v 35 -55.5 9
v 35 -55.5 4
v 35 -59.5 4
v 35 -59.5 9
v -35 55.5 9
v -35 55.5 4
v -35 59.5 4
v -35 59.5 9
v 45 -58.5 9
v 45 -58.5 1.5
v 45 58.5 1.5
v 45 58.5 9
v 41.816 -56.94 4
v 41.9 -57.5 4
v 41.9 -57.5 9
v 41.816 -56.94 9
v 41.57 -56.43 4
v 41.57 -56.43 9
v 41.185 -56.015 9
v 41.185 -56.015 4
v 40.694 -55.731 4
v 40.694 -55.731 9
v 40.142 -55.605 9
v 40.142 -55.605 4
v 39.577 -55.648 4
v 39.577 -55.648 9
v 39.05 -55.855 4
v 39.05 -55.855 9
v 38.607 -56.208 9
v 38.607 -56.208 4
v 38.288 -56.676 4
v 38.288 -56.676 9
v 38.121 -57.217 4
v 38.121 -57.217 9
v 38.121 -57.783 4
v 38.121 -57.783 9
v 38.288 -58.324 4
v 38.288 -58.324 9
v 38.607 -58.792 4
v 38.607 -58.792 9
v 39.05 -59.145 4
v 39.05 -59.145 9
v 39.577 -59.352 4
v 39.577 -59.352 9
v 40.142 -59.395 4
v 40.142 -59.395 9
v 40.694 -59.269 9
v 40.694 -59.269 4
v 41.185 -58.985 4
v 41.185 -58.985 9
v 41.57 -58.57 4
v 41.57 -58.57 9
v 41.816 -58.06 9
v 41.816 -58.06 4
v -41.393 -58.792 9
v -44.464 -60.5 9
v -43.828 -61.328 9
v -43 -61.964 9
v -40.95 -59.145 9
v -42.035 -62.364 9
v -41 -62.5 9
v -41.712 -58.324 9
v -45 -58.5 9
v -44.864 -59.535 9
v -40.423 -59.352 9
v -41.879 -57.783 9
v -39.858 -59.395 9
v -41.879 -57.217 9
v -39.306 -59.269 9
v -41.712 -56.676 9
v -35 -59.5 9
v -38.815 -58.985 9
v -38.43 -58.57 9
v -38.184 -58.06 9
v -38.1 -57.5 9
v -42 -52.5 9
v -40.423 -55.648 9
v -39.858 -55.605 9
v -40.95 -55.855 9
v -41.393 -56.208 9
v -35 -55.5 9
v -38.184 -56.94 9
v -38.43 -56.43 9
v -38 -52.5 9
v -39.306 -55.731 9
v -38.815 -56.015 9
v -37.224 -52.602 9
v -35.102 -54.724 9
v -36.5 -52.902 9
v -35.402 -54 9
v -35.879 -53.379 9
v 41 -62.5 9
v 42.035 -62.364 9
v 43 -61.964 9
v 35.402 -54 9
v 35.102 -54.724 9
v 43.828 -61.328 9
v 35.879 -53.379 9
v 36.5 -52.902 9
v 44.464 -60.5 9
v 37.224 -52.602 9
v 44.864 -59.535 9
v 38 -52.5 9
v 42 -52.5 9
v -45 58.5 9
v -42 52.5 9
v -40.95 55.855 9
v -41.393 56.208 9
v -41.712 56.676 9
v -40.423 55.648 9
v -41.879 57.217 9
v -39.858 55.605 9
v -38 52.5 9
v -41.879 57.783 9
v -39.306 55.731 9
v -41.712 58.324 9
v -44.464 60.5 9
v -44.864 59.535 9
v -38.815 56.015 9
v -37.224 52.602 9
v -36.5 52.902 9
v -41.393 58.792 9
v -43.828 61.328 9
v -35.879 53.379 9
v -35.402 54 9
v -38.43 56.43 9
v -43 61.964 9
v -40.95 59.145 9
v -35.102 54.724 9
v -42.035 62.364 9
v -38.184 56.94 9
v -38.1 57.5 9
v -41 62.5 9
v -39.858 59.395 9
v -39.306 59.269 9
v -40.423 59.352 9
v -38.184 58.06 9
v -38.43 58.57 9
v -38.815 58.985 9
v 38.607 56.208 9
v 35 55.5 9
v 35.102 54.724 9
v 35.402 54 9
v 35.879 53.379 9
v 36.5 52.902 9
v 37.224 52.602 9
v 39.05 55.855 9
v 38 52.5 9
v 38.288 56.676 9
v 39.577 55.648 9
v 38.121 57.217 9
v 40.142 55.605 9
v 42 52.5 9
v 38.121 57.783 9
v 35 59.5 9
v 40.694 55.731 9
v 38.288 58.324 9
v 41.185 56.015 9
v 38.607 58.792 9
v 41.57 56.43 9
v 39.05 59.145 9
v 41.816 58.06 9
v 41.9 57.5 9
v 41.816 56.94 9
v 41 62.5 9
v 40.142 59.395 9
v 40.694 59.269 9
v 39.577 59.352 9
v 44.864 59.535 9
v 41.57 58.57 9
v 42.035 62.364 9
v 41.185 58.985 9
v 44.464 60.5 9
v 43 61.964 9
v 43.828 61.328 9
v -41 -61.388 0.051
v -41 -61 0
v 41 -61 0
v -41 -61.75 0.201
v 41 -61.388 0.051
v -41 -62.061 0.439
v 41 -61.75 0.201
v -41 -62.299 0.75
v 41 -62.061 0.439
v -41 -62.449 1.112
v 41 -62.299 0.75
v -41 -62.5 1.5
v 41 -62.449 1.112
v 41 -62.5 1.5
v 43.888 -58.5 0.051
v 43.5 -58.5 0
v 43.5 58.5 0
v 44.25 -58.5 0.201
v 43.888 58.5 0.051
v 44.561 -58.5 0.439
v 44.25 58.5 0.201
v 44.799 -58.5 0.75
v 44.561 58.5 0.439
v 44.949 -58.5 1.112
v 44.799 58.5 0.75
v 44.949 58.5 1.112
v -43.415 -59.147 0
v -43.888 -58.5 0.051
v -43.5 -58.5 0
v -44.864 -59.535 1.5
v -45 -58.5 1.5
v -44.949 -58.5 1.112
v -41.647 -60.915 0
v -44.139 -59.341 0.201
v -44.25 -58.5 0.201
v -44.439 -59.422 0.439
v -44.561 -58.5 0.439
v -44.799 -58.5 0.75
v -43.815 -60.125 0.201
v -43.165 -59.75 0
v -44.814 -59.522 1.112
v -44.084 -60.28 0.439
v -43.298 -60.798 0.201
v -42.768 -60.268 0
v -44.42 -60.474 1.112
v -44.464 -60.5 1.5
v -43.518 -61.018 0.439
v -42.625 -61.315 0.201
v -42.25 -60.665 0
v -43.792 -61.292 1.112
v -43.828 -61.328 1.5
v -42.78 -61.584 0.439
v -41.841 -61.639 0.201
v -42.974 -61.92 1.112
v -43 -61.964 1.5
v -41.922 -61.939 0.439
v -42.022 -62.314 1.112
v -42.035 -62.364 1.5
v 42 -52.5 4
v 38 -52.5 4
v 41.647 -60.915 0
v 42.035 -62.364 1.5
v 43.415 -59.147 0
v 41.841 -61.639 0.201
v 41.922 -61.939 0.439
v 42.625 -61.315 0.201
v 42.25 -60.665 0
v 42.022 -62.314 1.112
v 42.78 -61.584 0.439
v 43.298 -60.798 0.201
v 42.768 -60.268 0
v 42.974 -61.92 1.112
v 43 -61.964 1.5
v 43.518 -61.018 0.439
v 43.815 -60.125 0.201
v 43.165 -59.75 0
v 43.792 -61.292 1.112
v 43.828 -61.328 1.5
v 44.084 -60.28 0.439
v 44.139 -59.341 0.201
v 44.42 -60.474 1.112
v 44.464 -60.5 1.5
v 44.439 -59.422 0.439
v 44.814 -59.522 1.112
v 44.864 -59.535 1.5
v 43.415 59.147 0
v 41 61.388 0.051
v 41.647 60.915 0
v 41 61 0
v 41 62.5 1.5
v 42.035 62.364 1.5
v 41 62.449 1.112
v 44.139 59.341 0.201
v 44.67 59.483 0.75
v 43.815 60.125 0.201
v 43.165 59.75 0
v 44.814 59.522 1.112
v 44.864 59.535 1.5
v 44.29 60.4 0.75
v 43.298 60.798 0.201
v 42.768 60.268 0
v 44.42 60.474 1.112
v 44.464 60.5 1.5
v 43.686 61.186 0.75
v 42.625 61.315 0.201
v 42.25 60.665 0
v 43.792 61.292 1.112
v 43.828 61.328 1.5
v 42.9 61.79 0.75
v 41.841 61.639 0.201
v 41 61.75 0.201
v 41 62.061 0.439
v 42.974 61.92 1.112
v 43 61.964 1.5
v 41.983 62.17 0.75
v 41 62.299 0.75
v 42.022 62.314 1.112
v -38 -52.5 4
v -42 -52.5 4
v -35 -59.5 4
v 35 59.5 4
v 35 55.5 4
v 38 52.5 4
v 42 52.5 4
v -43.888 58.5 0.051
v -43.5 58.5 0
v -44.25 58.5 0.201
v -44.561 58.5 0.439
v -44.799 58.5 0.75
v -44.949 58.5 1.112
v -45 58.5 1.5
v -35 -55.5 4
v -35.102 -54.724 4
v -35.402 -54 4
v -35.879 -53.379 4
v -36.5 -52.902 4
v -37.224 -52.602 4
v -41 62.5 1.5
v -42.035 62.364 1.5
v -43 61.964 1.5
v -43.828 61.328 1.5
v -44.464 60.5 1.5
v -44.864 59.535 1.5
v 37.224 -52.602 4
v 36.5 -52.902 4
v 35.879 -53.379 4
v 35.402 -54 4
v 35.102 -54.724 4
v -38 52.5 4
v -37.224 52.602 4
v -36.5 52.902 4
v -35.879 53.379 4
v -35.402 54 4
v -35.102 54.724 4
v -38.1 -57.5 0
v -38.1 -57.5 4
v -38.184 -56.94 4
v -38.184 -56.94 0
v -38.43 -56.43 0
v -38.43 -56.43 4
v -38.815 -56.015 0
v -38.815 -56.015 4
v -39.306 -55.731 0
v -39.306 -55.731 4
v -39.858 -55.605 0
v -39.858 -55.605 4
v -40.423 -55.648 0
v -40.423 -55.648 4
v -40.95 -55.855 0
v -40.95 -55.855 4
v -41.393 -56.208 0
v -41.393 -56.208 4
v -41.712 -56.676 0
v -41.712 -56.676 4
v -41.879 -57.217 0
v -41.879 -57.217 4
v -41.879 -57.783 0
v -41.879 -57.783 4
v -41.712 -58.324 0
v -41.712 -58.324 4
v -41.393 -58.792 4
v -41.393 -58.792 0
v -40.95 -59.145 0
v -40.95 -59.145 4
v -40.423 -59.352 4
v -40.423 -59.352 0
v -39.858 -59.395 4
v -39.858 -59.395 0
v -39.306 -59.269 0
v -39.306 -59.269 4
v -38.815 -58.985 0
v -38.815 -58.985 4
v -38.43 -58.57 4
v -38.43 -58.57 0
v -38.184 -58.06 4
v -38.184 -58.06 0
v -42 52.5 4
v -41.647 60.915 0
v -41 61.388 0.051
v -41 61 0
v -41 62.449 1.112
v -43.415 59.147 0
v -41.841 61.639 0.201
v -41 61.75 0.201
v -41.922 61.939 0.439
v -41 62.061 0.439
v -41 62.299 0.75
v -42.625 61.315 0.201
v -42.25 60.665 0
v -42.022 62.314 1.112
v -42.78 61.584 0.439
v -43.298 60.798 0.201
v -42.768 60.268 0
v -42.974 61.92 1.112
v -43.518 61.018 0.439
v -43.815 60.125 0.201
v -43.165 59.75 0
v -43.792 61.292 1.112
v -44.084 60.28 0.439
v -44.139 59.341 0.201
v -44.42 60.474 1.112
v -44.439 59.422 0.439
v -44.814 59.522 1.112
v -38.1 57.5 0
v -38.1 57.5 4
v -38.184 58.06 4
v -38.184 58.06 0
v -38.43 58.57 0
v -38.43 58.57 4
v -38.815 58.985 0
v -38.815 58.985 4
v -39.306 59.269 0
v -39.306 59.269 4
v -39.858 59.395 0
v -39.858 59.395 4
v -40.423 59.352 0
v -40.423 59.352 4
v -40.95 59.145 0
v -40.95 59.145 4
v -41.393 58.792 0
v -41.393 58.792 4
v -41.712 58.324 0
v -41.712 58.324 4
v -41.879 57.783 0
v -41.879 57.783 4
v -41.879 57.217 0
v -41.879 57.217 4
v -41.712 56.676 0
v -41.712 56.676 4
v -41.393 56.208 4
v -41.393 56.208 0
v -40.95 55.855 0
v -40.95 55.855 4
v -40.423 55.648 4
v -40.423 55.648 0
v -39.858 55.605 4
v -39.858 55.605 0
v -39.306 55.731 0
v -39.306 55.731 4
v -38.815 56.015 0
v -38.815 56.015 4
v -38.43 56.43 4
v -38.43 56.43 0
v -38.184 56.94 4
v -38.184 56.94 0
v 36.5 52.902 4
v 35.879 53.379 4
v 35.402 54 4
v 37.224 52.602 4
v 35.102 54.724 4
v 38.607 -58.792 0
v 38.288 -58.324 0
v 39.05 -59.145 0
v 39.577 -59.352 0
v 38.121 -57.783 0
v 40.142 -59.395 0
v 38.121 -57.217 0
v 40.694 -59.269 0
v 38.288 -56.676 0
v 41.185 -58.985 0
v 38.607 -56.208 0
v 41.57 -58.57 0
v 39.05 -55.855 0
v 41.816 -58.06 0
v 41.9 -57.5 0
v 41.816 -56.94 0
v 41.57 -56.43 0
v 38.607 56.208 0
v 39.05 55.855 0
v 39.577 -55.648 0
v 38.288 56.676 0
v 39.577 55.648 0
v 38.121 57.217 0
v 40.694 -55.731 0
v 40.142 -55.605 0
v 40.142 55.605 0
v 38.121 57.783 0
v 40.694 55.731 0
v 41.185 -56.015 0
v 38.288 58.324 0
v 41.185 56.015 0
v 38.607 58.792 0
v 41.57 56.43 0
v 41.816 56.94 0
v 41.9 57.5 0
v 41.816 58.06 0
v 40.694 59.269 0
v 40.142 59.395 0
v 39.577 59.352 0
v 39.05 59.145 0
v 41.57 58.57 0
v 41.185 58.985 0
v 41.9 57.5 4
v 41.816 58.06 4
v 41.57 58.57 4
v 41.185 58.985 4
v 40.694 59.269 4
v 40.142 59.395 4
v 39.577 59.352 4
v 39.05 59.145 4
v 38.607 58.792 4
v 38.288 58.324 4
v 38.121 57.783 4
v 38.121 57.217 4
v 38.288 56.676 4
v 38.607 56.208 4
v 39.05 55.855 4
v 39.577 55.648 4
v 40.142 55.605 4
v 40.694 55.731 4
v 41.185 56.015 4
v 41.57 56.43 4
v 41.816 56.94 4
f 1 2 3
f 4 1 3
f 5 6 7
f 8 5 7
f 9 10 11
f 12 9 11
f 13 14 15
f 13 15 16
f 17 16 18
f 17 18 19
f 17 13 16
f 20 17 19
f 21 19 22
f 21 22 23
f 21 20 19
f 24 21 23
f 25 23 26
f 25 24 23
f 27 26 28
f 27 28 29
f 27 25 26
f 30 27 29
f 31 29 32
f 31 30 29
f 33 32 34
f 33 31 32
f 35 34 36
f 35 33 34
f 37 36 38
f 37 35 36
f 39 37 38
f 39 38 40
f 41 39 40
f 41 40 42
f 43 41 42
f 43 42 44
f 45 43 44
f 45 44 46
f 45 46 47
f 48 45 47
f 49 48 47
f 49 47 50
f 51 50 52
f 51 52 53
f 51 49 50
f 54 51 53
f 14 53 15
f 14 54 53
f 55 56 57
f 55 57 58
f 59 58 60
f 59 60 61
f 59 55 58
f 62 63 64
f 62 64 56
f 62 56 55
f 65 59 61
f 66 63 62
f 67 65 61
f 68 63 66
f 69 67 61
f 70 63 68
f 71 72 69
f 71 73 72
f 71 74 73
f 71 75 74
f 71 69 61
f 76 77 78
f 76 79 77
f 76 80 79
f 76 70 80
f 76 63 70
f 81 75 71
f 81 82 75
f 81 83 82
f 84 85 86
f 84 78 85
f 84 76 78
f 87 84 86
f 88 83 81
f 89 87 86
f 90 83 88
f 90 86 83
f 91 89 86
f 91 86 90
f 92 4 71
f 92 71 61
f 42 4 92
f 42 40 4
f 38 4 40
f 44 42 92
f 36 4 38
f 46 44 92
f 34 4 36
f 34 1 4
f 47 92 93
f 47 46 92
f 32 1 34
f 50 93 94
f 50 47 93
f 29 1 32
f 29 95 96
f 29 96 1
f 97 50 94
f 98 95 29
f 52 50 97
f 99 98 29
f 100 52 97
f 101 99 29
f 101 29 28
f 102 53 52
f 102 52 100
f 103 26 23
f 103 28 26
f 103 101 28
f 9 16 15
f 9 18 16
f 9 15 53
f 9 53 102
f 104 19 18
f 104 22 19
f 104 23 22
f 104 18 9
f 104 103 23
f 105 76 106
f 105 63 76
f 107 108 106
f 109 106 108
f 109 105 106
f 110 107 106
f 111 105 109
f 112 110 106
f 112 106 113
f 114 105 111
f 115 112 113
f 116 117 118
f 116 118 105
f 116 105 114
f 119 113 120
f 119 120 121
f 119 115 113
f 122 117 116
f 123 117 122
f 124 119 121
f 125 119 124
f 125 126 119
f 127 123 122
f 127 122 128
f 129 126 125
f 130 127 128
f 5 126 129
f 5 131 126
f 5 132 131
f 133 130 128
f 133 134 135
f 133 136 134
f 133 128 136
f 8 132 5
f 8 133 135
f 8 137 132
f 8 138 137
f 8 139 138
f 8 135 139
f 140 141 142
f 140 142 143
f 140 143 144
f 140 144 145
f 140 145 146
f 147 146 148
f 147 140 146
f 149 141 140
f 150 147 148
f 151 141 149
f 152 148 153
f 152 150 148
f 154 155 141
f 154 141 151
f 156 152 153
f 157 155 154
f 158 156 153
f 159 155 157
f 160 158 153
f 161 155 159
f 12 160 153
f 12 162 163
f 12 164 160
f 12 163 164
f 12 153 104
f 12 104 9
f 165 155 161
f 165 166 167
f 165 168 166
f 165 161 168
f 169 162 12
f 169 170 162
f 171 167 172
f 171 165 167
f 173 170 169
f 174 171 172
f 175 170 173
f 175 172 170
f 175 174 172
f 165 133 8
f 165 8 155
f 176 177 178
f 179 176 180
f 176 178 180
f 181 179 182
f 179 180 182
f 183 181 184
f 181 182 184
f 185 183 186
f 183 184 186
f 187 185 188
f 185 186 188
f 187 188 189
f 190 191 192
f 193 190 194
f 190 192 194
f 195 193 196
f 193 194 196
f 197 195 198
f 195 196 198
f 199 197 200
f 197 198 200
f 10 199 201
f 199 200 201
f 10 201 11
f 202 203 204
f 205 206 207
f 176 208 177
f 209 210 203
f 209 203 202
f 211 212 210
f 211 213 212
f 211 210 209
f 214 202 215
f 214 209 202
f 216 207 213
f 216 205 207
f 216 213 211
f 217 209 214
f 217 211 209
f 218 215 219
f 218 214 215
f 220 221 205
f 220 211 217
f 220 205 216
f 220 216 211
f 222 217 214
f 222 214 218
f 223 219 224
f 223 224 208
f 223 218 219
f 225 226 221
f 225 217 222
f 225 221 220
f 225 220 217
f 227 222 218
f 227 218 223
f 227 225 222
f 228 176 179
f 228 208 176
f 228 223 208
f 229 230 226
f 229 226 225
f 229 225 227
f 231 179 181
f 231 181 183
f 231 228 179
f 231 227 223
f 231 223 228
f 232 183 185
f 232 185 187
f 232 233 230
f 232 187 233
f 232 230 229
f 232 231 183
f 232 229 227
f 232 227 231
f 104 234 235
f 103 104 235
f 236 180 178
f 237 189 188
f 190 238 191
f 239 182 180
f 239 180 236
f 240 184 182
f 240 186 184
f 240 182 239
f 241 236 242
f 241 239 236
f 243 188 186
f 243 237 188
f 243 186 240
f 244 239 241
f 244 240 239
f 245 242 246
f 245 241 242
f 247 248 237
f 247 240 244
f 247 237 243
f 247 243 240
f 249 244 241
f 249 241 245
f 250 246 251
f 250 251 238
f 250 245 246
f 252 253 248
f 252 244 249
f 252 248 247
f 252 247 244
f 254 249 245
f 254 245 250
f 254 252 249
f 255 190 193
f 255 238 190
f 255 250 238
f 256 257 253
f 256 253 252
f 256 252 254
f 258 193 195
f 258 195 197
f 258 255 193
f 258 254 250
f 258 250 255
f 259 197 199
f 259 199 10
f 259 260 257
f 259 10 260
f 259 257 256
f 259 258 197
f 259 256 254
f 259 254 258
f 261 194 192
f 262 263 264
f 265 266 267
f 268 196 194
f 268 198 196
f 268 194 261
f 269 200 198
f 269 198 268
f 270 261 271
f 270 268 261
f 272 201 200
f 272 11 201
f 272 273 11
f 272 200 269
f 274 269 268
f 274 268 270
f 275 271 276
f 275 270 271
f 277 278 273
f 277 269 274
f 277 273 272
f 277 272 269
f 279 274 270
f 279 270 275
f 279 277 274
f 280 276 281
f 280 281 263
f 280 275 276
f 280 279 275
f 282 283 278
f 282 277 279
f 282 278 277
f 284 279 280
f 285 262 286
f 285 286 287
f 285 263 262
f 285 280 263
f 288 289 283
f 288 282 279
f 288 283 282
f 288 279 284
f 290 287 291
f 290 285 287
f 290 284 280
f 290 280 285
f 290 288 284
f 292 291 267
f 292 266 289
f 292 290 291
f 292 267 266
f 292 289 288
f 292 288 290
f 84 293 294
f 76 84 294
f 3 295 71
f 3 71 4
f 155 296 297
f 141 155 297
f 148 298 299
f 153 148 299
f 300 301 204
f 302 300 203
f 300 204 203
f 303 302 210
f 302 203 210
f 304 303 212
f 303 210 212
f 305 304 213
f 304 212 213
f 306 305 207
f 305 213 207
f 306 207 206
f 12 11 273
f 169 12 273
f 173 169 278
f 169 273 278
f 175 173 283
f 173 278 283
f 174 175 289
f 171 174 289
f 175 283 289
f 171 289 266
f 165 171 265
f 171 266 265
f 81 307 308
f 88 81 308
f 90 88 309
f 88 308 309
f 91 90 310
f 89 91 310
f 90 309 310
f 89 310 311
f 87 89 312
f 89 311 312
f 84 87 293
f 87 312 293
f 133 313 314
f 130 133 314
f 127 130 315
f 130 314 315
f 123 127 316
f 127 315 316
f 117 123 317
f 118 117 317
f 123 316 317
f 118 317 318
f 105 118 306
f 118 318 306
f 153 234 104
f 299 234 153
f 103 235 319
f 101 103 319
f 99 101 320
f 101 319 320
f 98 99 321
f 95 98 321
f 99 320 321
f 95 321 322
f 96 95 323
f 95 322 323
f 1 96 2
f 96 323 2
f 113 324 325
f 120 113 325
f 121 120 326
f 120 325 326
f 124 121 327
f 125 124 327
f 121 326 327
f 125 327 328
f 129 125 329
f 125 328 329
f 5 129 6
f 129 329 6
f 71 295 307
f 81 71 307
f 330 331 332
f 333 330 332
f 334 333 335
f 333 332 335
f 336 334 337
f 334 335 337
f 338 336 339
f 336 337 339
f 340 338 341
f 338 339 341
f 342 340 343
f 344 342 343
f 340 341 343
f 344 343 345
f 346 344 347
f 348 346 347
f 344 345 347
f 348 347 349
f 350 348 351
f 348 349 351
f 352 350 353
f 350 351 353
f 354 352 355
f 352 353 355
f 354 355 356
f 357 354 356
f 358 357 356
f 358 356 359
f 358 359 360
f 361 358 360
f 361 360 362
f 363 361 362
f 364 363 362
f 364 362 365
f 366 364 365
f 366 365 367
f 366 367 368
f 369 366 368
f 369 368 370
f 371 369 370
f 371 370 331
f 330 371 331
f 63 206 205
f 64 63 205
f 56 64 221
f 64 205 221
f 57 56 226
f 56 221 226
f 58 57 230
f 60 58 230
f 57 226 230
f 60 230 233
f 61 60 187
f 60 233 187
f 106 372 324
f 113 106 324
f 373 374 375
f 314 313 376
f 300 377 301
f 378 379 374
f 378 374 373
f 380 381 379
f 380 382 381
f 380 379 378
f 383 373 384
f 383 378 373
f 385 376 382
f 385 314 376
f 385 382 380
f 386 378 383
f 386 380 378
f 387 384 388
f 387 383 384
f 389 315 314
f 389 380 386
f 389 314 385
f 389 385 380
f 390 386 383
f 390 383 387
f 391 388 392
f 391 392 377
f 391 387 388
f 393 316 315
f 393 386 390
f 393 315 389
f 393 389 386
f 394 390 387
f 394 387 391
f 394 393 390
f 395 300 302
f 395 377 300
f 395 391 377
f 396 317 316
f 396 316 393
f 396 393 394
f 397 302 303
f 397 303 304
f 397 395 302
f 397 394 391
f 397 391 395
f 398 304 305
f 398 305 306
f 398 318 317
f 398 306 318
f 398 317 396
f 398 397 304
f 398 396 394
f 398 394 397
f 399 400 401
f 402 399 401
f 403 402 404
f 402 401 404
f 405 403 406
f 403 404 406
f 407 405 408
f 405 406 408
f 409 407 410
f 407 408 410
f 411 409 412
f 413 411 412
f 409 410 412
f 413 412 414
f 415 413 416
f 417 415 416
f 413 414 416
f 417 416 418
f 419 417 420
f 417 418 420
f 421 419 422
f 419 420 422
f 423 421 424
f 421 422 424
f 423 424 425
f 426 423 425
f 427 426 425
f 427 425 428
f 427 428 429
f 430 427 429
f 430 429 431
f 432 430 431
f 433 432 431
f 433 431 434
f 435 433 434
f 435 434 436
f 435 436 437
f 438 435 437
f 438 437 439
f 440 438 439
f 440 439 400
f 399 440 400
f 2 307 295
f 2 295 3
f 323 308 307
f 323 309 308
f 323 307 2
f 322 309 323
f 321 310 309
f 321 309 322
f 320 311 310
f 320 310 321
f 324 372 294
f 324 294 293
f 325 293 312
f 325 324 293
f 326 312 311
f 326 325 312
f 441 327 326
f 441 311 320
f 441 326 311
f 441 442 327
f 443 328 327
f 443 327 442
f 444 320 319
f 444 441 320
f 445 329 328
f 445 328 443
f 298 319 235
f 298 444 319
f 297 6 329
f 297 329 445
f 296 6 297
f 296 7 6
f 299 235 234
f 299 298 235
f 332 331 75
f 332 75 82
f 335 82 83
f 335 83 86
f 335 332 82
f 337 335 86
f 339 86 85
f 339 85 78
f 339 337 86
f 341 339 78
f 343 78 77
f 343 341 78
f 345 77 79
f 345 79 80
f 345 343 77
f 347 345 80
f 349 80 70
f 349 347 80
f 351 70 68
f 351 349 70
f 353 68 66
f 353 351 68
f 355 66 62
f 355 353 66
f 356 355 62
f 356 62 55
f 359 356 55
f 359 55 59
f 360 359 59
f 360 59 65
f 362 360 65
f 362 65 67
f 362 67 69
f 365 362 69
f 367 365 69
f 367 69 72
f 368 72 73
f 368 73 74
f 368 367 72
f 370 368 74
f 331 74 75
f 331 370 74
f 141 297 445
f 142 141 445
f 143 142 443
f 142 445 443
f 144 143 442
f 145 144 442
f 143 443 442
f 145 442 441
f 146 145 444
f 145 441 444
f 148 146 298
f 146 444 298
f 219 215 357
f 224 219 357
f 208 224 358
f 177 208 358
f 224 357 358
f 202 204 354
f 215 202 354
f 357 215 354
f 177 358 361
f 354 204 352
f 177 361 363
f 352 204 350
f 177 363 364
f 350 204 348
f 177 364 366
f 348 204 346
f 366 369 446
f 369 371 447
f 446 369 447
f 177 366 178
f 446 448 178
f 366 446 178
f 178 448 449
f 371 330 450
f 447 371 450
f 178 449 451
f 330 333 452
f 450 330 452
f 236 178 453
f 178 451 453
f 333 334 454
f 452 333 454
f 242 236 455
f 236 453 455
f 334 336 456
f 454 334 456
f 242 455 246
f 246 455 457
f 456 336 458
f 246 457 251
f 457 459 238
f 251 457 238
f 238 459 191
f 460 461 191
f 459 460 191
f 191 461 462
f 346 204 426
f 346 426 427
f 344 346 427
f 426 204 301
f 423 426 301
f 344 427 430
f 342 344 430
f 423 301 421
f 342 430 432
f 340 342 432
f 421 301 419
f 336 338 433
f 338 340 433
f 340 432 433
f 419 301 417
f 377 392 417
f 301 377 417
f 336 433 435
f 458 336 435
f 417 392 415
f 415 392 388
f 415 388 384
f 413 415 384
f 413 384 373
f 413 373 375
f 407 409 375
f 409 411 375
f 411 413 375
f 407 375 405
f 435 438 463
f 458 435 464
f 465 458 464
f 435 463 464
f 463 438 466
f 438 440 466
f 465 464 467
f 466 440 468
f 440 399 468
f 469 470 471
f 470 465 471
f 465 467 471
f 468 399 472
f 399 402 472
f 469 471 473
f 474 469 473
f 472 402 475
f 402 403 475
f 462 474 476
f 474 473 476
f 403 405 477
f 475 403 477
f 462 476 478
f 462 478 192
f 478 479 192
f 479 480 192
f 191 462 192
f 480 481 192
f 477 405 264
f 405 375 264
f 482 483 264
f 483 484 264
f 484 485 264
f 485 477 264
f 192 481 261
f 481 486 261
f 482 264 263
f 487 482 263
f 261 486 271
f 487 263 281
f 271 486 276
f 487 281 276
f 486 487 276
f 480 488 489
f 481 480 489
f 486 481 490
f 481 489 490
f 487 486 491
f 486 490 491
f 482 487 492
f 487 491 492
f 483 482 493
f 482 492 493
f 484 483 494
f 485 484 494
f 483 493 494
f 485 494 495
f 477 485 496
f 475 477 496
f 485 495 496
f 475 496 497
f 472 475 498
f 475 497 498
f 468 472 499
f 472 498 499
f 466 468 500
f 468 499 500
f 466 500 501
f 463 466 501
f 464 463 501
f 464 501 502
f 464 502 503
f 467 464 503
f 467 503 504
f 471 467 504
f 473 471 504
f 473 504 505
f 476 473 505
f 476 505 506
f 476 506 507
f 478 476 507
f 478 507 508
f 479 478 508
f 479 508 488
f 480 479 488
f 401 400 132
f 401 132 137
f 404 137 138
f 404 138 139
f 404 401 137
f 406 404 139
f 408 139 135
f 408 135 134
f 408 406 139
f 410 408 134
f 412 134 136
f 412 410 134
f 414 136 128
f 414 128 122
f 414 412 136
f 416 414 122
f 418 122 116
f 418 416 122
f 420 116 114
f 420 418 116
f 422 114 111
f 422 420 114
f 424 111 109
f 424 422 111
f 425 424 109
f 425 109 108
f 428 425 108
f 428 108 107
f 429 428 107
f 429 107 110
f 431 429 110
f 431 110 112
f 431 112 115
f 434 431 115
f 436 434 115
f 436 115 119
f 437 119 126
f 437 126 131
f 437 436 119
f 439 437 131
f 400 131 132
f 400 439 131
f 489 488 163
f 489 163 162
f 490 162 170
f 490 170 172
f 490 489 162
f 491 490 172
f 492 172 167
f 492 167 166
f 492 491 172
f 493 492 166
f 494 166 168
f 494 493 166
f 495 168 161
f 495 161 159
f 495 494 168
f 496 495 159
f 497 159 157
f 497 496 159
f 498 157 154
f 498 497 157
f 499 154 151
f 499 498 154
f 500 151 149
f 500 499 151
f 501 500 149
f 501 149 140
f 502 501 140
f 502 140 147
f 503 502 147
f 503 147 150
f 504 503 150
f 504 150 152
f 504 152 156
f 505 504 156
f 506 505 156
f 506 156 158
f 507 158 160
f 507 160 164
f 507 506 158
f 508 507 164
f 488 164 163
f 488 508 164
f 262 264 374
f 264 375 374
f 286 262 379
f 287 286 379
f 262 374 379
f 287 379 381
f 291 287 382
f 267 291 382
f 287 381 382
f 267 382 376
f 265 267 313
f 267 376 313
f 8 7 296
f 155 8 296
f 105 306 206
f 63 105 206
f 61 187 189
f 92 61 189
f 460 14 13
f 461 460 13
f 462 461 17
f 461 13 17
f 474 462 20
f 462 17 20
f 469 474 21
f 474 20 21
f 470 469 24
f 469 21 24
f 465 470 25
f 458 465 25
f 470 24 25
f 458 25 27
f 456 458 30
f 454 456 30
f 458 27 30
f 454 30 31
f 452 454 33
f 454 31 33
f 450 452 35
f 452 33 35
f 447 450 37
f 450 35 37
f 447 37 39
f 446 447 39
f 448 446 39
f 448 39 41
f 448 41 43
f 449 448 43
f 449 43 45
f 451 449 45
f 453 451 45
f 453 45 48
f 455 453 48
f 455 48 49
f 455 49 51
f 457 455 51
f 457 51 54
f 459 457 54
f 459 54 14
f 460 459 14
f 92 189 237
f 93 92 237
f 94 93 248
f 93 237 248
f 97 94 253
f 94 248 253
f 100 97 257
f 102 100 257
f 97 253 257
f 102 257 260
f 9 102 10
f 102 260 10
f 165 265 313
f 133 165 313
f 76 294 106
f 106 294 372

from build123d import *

# Parameters (mm, degrees)
F1_DEPTH = 4
F2_W     = 3
F2_H     = 105
F2_W_2   = 70
F2_H_2   = 3
F2_R     = 1.9
F3_DEPTH = 5
F4_R     = 1.5
F5_DEPTH = 25
F6_DEPTH = 25
F7_DEPTH = 25
F8_DEPTH = 25


with BuildPart() as f1:
    # F0 (on Top) → F1 (new body)
    with BuildSketch(Plane.XY):
        with BuildLine():
            Line((41, 62.5), (-41, 62.5))
            ThreePointArc((-41, 62.5), (-43.8284271247, 61.3284271247), (-45, 58.5))
            Line((-45, 58.5), (-45, -58.5))
            ThreePointArc((-45, -58.5), (-43.8284271247, -61.3284271247), (-41, -62.5))
            Line((-41, -62.5), (41, -62.5))
            ThreePointArc((41, -62.5), (43.8284271247, -61.3284271247), (45, -58.5))
            Line((45, -58.5), (45, 58.5))
            ThreePointArc((45, 58.5), (43.8284271247, 61.3284271247), (41, 62.5))
        make_face()
    extrude(amount=F1_DEPTH)

    # F2 (on face) → F3 (join)
    with BuildSketch(Plane.XY.offset(4)):
        with Locations((43.5, 0)):
            Rectangle(F2_W, F2_H)
        with Locations((0, -61)):
            Rectangle(F2_W_2, F2_H_2)
        with Locations((-43.5, 0)):
            Rectangle(F2_W, F2_H)
        with Locations((0, 61)):
            Rectangle(F2_W_2, F2_H_2)
        with BuildLine():
            Line((-45, 58.5), (-45, 52.5))
            Line((-45, 52.5), (-42, 52.5))
            Line((-42, 52.5), (-38, 52.5))
            ThreePointArc((-38, 52.5), (-35.8786796564, 53.3786796564), (-35, 55.5))
            Line((-35, 55.5), (-35, 59.5))
            Line((-35, 59.5), (-35, 62.5))
            Line((-35, 62.5), (-41, 62.5))
            ThreePointArc((-41, 62.5), (-43.8284271247, 61.3284271247), (-45, 58.5))
        make_face()
        with Locations((-40, 57.5)):
            Circle(F2_R, mode=Mode.SUBTRACT)
        with BuildLine():
            Line((41, 62.5), (35, 62.5))
            Line((35, 62.5), (35, 59.5))
            Line((35, 59.5), (35, 55.5))
            ThreePointArc((35, 55.5), (35.8786796564, 53.3786796564), (38, 52.5))
            Line((38, 52.5), (42, 52.5))
            Line((42, 52.5), (45, 52.5))
            Line((45, 52.5), (45, 58.5))
            ThreePointArc((45, 58.5), (43.8284271247, 61.3284271247), (41, 62.5))
        make_face()
        with Locations((40, 57.5)):
            Circle(F2_R, mode=Mode.SUBTRACT)
        with BuildLine():
            Line((35, -59.5), (35, -62.5))
            Line((35, -62.5), (41, -62.5))
            ThreePointArc((41, -62.5), (43.8284271247, -61.3284271247), (45, -58.5))
            Line((45, -58.5), (45, -52.5))
            Line((45, -52.5), (42, -52.5))
            Line((42, -52.5), (38, -52.5))
            ThreePointArc((38, -52.5), (35.8786796564, -53.3786796564), (35, -55.5))
            Line((35, -55.5), (35, -59.5))
        make_face()
        with Locations((40, -57.5)):
            Circle(F2_R, mode=Mode.SUBTRACT)
        with BuildLine():
            Line((-42, -52.5), (-45, -52.5))
            Line((-45, -52.5), (-45, -58.5))
            ThreePointArc((-45, -58.5), (-43.8284271247, -61.3284271247), (-41, -62.5))
            Line((-41, -62.5), (-35, -62.5))
            Line((-35, -62.5), (-35, -59.5))
            Line((-35, -59.5), (-35, -55.5))
            ThreePointArc((-35, -55.5), (-35.8786796564, -53.3786796564), (-38, -52.5))
            Line((-38, -52.5), (-42, -52.5))
        make_face()
        with Locations((-40, -57.5)):
            Circle(F2_R, mode=Mode.SUBTRACT)
    extrude(amount=F3_DEPTH)

    # F4
    f4_edges = [f1.edges().sort_by_distance(p)[0] for p in [
        (0, 62.5, 0),
        (-43.828427, 61.328427, 0),
        (-45, 0, 0),
        (-43.828427, -61.328427, 0),
        (0, -62.5, 0),
        (43.828427, -61.328427, 0),
        (45, 0, 0),
        (43.828427, 61.328427, 0),
    ]]
    fillet(f4_edges, radius=F4_R)

    # F5 (cut): a face of the model
    f5_faces = [f1.faces().sort_by_distance(p)[0] for p in [
        (-40, 57.5, 4),
    ]]
    extrude(f5_faces, amount=-F5_DEPTH, mode=Mode.SUBTRACT)

    # F6 (cut): a face of the model
    f6_faces = [f1.faces().sort_by_distance(p)[0] for p in [
        (40, 57.5, 4),
    ]]
    extrude(f6_faces, amount=-F6_DEPTH, mode=Mode.SUBTRACT)

    # F7 (cut): a face of the model
    f7_faces = [f1.faces().sort_by_distance(p)[0] for p in [
        (40, -57.5, 4),
    ]]
    extrude(f7_faces, amount=-F7_DEPTH, mode=Mode.SUBTRACT)

    # F8 (cut): a face of the model
    f8_faces = [f1.faces().sort_by_distance(p)[0] for p in [
        (-40, -57.5, 4),
    ]]
    extrude(f8_faces, amount=-F8_DEPTH, mode=Mode.SUBTRACT)


solid = f1.part
